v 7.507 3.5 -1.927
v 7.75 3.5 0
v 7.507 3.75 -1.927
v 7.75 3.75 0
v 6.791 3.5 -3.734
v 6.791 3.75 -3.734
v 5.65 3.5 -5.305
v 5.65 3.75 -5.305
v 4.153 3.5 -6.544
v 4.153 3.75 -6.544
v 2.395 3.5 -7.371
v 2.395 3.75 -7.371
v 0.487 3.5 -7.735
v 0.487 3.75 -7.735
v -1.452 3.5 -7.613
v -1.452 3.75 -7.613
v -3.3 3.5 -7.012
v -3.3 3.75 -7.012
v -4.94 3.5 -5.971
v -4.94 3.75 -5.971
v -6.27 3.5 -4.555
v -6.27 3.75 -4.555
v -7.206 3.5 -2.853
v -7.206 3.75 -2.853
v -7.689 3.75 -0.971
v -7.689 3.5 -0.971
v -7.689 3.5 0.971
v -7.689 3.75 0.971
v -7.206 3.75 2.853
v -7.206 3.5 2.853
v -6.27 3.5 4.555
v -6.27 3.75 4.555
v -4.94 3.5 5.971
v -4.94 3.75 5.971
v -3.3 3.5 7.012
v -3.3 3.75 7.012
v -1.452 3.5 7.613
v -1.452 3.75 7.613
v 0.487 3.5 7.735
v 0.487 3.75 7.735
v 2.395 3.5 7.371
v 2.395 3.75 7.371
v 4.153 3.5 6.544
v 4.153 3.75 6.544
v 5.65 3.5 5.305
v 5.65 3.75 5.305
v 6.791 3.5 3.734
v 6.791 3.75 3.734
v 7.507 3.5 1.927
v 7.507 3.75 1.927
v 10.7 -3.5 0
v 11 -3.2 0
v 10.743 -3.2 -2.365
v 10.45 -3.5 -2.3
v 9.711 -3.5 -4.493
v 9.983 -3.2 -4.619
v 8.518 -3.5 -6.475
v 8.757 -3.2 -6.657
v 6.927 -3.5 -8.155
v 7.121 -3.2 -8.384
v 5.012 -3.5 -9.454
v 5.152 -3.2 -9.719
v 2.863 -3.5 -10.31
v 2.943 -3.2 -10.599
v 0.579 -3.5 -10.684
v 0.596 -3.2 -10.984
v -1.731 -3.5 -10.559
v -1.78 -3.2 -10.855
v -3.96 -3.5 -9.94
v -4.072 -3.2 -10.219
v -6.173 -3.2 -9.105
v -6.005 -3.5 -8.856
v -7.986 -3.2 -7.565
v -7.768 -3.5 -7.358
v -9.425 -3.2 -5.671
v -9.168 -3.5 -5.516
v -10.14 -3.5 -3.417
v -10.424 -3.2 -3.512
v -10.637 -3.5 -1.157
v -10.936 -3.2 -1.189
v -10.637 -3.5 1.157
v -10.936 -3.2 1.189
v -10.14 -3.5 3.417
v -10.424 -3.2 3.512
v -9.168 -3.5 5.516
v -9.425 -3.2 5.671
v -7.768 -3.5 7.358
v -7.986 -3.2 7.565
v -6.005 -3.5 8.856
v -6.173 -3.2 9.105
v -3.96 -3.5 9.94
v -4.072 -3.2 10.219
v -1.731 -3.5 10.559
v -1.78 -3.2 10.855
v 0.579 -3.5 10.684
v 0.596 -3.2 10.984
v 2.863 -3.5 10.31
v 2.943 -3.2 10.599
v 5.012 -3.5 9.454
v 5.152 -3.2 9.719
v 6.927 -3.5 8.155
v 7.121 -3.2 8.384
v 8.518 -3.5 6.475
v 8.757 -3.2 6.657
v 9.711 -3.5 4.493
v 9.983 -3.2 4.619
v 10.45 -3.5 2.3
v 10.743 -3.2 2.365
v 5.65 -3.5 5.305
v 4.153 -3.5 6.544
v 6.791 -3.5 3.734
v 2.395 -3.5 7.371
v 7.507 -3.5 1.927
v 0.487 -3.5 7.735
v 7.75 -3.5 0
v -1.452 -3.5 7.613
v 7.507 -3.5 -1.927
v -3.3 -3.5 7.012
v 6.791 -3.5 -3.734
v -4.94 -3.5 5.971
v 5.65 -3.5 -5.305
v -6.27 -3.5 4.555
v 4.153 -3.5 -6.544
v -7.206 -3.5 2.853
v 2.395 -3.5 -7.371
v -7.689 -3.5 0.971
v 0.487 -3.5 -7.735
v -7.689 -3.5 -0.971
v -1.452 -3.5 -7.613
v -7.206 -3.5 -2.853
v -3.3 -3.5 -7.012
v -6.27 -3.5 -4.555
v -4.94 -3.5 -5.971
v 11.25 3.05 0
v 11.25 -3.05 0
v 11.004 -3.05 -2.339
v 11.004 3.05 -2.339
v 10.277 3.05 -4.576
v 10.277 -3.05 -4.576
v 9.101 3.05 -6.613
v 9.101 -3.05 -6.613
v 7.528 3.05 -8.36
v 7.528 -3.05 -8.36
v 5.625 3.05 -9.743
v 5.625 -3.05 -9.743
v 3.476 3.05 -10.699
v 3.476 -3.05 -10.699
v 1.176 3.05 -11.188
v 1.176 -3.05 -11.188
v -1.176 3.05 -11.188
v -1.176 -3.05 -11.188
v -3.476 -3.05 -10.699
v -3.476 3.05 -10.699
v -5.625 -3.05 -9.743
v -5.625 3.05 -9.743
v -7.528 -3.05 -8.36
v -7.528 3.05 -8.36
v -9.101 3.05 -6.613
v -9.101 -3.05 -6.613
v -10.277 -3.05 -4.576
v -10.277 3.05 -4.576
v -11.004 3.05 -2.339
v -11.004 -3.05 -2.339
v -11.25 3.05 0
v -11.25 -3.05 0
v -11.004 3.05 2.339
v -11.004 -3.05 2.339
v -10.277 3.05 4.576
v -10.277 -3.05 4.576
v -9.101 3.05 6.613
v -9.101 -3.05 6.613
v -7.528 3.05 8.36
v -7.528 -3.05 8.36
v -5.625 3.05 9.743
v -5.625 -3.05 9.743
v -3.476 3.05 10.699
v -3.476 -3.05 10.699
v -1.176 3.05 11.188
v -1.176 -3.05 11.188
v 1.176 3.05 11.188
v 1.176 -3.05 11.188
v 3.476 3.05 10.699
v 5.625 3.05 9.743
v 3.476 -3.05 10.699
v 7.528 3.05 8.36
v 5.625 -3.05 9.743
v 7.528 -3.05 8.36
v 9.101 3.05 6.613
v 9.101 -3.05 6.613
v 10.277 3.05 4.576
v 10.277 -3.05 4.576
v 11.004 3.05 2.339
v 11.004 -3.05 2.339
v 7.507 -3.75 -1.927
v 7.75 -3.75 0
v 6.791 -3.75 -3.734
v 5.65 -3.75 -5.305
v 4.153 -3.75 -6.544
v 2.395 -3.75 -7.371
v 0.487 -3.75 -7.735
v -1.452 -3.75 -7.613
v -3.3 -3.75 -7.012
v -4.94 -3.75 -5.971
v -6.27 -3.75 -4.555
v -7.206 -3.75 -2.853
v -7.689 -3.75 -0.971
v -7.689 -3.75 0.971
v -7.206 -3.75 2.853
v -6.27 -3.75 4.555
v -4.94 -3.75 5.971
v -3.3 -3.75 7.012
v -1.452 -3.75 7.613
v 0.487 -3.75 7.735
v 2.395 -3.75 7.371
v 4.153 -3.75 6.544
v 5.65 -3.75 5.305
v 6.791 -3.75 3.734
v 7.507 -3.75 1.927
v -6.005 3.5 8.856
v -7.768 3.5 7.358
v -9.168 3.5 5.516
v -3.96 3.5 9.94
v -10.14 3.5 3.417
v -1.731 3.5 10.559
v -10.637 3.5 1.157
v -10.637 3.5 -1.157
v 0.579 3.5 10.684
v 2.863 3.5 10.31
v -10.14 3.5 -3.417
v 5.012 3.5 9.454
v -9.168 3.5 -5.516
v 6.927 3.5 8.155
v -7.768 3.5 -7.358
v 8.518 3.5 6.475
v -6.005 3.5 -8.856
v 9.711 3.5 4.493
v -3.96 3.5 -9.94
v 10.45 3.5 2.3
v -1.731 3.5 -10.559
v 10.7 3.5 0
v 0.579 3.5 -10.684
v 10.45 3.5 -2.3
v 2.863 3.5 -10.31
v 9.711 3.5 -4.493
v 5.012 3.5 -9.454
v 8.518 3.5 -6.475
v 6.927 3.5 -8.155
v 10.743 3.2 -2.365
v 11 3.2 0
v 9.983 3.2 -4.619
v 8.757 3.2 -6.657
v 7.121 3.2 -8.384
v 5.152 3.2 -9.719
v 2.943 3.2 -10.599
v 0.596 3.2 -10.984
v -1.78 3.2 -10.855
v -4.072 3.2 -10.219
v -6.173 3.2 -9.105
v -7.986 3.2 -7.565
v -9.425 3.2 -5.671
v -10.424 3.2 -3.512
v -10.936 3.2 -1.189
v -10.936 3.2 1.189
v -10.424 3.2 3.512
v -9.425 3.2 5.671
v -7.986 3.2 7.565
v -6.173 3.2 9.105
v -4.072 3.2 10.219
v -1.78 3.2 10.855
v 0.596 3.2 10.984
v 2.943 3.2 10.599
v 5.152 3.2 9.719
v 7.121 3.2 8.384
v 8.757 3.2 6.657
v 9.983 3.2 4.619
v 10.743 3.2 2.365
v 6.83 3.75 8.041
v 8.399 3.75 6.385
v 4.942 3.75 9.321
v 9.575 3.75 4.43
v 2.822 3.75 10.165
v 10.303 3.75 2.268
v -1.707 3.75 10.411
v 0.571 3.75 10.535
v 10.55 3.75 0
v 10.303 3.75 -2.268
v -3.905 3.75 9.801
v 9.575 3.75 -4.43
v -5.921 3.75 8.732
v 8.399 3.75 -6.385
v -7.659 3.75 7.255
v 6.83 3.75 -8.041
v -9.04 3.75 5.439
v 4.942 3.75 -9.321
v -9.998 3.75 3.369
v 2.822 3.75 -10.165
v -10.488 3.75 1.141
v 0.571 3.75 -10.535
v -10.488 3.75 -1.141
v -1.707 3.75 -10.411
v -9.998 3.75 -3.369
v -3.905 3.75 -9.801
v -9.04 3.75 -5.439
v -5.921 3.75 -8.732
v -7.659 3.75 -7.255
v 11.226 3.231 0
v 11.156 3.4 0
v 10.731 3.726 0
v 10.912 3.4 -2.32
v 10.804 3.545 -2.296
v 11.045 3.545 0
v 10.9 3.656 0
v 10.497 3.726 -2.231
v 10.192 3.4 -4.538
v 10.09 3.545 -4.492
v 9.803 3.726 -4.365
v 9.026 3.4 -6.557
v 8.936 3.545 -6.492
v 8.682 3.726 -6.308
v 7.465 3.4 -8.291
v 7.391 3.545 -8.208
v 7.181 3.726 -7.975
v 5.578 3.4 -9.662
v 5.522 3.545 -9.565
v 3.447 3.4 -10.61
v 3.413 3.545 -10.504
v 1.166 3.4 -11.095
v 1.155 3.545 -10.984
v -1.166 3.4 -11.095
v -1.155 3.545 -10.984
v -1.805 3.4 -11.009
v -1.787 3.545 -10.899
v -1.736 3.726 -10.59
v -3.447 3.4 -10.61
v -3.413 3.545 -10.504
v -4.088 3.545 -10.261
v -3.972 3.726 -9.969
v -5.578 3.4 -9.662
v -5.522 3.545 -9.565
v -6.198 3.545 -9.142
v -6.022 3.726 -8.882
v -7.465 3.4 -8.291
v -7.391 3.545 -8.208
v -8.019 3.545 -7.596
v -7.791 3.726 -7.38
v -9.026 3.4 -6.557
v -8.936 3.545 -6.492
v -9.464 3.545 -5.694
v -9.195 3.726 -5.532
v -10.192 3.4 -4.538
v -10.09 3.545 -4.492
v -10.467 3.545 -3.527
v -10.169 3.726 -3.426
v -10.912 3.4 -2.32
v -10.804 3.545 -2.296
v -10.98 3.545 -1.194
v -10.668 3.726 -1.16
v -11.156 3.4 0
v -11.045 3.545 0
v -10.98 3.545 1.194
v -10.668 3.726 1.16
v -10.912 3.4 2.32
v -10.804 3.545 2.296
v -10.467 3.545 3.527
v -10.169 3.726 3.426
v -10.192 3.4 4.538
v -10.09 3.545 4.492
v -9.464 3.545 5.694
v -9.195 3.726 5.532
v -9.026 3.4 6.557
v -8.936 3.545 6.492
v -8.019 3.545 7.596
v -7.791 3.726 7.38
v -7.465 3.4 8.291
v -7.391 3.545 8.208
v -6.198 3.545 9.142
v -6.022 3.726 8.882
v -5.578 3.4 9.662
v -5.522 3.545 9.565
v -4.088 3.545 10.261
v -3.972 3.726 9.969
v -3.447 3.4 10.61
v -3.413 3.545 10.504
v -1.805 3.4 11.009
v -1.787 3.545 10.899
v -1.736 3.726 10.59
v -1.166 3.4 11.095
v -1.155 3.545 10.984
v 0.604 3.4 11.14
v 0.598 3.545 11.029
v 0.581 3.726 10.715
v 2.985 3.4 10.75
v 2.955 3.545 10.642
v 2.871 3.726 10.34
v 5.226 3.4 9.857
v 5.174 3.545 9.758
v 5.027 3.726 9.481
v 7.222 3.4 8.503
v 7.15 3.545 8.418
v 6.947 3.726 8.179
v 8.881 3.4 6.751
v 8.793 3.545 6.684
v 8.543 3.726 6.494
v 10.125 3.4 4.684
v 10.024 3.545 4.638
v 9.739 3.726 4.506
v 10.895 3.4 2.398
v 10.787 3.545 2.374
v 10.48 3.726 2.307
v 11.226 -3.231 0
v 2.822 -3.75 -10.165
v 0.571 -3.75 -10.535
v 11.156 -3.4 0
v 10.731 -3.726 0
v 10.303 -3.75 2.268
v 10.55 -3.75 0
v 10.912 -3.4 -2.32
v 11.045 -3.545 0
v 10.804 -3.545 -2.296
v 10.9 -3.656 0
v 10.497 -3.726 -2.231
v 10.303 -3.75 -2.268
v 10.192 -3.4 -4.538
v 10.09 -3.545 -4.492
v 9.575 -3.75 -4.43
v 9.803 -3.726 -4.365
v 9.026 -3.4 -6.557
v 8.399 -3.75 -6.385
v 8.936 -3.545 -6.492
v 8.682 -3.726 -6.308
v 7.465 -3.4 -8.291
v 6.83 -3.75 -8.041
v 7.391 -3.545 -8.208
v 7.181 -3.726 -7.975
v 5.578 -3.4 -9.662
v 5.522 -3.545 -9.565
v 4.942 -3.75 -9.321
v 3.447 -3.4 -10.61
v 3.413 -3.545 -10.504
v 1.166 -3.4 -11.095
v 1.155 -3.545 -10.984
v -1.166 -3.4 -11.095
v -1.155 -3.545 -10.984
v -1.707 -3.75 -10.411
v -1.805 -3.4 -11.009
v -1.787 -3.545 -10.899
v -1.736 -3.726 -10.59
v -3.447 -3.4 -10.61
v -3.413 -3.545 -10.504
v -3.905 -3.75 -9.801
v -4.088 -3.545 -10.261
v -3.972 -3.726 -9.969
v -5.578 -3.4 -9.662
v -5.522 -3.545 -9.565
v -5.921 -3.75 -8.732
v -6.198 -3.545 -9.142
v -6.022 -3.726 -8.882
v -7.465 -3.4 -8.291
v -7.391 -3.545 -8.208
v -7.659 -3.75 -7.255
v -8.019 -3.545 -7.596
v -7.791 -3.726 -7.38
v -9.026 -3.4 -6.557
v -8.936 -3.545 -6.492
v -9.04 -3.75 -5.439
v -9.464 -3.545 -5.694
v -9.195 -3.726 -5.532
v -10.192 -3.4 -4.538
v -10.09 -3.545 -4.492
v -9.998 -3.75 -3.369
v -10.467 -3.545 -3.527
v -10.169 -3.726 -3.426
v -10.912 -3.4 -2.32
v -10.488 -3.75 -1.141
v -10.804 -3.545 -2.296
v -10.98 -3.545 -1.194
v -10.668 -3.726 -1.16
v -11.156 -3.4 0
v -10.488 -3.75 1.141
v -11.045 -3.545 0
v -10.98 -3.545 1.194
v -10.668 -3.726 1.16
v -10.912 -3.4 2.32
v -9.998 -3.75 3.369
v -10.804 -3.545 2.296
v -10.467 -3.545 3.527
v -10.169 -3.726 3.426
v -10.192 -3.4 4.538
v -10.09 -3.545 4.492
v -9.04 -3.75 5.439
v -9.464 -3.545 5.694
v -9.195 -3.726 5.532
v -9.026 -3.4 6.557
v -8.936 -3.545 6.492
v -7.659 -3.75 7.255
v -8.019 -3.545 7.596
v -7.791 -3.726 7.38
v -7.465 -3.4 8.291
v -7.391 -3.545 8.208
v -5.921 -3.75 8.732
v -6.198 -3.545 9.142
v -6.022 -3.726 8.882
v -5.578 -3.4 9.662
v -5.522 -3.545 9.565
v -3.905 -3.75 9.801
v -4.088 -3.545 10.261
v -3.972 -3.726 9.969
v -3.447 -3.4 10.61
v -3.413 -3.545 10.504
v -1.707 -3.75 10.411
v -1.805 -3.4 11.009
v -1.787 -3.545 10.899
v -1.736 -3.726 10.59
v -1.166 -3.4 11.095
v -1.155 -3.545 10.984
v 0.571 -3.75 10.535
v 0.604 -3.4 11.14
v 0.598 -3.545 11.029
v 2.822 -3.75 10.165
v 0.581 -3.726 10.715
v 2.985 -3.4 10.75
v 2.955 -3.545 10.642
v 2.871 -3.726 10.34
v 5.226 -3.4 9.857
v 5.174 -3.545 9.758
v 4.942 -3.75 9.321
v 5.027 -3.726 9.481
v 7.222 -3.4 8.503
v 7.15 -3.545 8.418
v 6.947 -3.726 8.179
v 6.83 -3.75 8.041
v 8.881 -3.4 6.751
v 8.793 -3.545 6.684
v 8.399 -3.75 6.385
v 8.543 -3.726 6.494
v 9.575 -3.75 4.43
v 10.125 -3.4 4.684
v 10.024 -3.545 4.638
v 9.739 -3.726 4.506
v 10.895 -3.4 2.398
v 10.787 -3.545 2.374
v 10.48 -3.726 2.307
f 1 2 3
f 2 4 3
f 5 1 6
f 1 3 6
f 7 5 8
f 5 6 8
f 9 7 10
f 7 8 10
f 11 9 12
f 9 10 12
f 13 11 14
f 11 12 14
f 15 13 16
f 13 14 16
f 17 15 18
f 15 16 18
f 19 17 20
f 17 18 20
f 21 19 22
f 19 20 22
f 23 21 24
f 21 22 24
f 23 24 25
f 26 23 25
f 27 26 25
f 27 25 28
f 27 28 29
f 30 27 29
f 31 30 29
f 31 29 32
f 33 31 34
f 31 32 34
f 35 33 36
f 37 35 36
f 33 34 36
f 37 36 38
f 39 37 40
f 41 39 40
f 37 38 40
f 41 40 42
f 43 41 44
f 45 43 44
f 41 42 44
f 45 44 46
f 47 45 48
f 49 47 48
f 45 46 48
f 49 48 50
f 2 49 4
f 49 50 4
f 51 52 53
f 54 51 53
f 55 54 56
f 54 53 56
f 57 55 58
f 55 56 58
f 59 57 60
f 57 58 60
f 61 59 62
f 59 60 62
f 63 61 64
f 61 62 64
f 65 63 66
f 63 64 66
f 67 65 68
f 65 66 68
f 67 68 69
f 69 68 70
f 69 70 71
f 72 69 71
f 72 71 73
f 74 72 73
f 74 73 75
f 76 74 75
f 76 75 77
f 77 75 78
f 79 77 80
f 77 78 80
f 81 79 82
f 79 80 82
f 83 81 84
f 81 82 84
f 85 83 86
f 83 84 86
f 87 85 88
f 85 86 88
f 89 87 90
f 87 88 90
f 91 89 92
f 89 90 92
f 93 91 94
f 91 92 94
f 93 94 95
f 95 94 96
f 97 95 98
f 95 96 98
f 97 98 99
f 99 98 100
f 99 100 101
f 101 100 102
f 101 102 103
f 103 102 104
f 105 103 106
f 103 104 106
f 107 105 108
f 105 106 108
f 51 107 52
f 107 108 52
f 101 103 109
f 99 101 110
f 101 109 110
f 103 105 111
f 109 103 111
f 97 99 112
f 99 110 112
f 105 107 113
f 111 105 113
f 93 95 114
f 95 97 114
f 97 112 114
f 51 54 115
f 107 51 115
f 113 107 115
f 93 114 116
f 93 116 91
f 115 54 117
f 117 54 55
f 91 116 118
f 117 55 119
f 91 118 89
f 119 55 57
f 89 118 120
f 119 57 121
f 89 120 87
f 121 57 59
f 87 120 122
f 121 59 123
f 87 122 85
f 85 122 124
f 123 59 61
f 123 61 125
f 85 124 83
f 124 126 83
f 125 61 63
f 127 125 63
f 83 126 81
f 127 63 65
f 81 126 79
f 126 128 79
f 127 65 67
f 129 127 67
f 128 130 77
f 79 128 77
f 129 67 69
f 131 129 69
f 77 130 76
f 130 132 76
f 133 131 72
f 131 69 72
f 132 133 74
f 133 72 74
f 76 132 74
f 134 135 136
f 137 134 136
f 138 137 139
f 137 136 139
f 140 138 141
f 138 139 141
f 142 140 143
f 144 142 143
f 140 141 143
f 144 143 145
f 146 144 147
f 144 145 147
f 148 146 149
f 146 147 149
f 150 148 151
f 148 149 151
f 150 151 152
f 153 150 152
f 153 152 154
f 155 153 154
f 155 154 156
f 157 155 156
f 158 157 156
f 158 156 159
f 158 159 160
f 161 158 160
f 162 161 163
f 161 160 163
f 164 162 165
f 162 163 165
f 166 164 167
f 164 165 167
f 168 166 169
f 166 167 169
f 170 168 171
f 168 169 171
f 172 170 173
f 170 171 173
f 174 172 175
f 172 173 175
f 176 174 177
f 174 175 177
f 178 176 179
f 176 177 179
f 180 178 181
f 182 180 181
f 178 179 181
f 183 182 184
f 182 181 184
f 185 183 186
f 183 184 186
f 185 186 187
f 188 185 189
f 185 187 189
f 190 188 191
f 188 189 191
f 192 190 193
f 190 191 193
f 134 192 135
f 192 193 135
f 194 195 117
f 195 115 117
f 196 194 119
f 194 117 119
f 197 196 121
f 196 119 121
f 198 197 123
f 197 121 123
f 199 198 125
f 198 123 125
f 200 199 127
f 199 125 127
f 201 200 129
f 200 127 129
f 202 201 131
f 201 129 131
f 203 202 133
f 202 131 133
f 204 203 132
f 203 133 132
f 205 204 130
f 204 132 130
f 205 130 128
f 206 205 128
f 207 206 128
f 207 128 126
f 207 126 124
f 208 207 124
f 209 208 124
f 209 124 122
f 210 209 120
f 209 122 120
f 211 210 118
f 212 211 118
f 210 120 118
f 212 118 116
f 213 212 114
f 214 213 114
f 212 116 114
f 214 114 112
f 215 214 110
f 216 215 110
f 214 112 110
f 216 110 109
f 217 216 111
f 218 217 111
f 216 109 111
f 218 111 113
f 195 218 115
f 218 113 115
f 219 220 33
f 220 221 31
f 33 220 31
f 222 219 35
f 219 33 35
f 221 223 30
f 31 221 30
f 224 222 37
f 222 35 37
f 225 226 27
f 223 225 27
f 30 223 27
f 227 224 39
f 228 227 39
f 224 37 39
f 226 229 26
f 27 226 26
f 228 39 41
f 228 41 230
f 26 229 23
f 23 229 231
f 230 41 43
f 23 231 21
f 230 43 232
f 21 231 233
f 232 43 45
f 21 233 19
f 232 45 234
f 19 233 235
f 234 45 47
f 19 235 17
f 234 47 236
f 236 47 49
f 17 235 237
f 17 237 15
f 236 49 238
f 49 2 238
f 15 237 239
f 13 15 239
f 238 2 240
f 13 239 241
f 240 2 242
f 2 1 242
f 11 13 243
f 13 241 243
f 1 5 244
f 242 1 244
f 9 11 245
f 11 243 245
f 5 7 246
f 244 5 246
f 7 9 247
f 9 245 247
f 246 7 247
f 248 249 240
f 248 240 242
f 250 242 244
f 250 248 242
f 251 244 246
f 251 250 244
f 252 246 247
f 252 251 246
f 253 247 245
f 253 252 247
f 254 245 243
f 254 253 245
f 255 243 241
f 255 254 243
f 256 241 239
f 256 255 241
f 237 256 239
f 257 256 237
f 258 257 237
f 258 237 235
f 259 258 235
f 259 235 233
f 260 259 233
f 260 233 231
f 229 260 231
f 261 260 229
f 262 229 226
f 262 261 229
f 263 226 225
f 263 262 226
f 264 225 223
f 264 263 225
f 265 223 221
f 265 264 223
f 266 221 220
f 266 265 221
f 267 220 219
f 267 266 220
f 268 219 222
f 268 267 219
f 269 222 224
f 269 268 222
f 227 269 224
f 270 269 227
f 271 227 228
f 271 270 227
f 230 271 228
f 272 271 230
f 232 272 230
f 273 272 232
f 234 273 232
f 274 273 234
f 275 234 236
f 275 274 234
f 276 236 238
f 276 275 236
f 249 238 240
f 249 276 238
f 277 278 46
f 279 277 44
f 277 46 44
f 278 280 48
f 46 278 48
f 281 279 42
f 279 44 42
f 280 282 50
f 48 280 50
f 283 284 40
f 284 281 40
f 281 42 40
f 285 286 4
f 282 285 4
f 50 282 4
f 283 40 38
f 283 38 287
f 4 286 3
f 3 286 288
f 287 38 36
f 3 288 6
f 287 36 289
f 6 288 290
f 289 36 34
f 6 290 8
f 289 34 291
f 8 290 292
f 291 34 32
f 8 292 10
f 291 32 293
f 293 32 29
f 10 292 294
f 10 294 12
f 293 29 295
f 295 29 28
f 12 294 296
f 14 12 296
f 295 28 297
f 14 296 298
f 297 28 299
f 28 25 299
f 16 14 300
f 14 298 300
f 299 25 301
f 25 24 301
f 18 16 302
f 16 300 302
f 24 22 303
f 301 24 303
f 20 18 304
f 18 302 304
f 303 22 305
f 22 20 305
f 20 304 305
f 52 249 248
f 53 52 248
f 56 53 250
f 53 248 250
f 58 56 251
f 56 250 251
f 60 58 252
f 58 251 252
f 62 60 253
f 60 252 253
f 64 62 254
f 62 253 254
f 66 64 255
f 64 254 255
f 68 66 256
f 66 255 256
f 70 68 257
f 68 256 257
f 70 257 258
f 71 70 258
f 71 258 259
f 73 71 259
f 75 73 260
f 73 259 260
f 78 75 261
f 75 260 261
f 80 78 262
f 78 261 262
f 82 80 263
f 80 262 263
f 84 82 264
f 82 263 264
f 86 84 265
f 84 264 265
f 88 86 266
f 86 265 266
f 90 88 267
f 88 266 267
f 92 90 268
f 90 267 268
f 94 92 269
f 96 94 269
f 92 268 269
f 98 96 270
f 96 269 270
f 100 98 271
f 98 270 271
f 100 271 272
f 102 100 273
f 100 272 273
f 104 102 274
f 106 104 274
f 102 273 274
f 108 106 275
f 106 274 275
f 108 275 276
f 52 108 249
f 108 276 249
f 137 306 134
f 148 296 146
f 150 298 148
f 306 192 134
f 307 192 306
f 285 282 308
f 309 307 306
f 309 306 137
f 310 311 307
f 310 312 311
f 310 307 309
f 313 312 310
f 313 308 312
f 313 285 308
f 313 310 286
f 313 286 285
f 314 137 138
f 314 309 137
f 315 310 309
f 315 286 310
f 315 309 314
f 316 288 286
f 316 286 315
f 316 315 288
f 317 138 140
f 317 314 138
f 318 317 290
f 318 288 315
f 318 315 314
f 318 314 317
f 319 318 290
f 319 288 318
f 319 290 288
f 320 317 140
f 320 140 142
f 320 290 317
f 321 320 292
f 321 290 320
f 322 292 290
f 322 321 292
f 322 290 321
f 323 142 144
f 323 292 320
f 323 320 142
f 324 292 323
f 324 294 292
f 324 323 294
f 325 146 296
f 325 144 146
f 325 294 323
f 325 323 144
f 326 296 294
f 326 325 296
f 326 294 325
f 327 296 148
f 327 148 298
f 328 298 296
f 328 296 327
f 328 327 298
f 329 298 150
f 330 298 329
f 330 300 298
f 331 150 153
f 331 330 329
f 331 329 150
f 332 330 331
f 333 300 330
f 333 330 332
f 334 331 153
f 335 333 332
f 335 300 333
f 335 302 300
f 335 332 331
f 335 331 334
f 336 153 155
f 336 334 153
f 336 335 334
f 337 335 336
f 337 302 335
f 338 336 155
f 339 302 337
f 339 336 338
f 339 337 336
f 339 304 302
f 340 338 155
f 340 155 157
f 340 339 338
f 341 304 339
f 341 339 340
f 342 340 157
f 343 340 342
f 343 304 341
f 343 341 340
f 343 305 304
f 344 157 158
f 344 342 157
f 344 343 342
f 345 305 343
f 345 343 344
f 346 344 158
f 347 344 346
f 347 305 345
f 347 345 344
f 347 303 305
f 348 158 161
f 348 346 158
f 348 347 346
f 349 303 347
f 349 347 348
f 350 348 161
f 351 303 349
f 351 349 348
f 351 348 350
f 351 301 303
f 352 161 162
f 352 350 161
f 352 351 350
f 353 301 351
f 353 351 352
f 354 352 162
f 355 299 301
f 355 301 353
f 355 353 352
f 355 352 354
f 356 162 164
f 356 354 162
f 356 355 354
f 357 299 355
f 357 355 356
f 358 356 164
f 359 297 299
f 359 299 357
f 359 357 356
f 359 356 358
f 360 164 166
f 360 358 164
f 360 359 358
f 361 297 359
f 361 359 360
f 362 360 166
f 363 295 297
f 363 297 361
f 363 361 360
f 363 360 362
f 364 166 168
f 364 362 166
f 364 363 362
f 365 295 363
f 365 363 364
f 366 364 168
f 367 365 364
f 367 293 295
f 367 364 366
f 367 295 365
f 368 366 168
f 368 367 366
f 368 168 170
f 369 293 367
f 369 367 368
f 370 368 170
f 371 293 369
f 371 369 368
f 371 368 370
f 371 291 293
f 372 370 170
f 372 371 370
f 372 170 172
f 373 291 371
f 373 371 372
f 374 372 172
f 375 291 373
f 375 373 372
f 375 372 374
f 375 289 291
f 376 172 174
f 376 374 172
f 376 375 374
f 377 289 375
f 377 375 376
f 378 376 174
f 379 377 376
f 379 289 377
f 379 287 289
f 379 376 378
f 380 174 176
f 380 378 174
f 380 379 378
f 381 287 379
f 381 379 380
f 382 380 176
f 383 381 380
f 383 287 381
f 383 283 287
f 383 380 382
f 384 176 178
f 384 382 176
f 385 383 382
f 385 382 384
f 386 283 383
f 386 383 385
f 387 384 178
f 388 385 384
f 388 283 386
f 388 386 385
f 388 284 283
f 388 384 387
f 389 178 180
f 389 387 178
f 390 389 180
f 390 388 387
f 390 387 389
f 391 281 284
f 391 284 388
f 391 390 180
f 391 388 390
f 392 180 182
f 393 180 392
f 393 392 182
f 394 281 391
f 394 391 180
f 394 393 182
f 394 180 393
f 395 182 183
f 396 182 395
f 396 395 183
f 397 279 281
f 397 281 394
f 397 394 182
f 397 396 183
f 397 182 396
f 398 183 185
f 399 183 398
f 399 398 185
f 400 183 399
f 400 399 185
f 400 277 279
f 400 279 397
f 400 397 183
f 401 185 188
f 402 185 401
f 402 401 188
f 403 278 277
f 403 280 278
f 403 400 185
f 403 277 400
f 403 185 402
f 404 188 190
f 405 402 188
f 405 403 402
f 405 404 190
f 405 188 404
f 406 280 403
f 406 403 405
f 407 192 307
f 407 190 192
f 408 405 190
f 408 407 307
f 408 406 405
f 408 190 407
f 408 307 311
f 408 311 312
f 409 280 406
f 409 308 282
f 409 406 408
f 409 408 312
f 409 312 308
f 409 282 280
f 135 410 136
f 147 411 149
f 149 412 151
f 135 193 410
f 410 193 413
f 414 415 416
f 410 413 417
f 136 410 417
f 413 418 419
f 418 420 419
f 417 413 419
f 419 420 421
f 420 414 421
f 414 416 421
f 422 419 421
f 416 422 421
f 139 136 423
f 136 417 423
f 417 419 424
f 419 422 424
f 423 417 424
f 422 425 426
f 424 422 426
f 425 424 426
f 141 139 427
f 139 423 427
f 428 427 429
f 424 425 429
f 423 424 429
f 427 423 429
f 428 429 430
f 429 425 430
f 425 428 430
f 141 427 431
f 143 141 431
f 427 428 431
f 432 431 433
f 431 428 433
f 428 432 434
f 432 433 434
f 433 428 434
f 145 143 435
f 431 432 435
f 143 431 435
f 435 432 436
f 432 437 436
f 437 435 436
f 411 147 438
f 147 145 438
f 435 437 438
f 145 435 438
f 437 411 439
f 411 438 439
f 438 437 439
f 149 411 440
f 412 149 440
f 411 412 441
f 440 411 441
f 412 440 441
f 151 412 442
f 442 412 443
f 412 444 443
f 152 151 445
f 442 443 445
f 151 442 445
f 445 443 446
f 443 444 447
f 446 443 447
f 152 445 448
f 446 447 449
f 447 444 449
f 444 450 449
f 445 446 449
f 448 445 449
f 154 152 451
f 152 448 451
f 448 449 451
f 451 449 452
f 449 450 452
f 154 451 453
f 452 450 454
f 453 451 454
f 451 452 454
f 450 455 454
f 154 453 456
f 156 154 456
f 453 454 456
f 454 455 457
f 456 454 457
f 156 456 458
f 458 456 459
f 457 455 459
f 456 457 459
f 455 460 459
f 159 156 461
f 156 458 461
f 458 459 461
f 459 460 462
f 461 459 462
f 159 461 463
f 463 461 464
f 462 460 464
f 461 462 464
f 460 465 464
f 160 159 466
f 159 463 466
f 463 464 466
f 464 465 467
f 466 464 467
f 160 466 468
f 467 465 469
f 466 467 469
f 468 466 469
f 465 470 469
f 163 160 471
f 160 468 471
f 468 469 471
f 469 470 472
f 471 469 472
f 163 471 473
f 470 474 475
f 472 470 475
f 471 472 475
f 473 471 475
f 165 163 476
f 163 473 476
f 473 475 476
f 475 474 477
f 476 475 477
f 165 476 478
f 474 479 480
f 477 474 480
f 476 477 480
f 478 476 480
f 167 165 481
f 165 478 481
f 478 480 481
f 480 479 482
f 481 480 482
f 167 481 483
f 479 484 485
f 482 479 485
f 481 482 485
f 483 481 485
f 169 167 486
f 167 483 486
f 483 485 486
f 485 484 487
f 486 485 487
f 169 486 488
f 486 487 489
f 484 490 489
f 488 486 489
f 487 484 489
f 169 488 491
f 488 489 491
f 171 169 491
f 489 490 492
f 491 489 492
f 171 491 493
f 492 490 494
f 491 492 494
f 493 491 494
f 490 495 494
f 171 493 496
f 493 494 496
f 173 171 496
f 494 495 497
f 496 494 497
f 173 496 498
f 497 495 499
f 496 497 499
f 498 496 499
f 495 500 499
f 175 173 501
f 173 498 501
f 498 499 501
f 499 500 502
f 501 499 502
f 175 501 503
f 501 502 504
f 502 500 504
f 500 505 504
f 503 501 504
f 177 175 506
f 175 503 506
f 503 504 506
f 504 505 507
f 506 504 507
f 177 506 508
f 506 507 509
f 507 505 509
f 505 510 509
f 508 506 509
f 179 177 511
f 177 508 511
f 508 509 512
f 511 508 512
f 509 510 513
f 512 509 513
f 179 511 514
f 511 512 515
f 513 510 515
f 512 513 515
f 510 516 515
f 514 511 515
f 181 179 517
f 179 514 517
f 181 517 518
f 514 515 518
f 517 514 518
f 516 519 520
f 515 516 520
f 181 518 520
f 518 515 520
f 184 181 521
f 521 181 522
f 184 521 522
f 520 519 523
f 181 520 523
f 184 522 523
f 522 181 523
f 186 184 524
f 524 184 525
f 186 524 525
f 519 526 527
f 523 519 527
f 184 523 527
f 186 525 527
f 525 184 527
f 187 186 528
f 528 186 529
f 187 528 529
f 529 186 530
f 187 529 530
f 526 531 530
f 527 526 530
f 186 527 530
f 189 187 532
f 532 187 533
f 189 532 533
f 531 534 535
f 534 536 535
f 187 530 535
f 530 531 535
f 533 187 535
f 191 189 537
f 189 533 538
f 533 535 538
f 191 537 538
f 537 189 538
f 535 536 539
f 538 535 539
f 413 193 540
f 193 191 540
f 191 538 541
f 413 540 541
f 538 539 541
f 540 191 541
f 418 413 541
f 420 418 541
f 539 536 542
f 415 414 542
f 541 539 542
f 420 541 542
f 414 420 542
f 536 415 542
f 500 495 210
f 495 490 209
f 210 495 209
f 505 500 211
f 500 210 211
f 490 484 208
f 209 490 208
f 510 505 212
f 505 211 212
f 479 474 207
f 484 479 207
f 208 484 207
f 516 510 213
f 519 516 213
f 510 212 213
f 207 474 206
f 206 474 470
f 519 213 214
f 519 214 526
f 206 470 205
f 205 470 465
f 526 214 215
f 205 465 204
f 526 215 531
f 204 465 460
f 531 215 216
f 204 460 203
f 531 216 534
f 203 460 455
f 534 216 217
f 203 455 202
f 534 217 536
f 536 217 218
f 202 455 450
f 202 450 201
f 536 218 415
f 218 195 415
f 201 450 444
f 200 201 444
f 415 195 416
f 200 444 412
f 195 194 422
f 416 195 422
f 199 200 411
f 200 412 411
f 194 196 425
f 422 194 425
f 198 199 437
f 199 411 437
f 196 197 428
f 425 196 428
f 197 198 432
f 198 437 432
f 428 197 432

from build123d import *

# Parameters (mm, degrees)
FILLET2_R     = 0.7
CHAMFER1_SIZE = 0.3


with BuildPart() as part:
    # Sketch1 → Revolve1 (revolve)
    with BuildSketch(Plane.XY, mode=Mode.PRIVATE) as revolve1_sk:
        Polygon((-11.25, 3.75), (-11.25, -3.75), (-7.75, -3.75), (-7.75, -3.5), (-11, -3.5), (-11, 3.5), (-7.75, 3.5), (-7.75, 3.75), align=None)
    revolve(revolve1_sk.sketch.rotate(Axis((0, -3.75, 0), (0, 1, 0)), 180), axis=Axis((0, -3.75, 0), (0, 1, 0)))

    # Fillet2
    fillet2_edges = [part.edges().sort_by_distance(p)[0] for p in [
        (-11.25, 3.75, 0),
        (-11.25, -3.75, 0),
    ]]
    fillet(fillet2_edges, radius=FILLET2_R)

    # Chamfer1
    chamfer1_edges = [part.edges().sort_by_distance(p)[0] for p in [
        (-11, -3.5, 0),
        (-11, 3.5, 0),
    ]]
    chamfer(chamfer1_edges, length=CHAMFER1_SIZE)


solid = part.part
